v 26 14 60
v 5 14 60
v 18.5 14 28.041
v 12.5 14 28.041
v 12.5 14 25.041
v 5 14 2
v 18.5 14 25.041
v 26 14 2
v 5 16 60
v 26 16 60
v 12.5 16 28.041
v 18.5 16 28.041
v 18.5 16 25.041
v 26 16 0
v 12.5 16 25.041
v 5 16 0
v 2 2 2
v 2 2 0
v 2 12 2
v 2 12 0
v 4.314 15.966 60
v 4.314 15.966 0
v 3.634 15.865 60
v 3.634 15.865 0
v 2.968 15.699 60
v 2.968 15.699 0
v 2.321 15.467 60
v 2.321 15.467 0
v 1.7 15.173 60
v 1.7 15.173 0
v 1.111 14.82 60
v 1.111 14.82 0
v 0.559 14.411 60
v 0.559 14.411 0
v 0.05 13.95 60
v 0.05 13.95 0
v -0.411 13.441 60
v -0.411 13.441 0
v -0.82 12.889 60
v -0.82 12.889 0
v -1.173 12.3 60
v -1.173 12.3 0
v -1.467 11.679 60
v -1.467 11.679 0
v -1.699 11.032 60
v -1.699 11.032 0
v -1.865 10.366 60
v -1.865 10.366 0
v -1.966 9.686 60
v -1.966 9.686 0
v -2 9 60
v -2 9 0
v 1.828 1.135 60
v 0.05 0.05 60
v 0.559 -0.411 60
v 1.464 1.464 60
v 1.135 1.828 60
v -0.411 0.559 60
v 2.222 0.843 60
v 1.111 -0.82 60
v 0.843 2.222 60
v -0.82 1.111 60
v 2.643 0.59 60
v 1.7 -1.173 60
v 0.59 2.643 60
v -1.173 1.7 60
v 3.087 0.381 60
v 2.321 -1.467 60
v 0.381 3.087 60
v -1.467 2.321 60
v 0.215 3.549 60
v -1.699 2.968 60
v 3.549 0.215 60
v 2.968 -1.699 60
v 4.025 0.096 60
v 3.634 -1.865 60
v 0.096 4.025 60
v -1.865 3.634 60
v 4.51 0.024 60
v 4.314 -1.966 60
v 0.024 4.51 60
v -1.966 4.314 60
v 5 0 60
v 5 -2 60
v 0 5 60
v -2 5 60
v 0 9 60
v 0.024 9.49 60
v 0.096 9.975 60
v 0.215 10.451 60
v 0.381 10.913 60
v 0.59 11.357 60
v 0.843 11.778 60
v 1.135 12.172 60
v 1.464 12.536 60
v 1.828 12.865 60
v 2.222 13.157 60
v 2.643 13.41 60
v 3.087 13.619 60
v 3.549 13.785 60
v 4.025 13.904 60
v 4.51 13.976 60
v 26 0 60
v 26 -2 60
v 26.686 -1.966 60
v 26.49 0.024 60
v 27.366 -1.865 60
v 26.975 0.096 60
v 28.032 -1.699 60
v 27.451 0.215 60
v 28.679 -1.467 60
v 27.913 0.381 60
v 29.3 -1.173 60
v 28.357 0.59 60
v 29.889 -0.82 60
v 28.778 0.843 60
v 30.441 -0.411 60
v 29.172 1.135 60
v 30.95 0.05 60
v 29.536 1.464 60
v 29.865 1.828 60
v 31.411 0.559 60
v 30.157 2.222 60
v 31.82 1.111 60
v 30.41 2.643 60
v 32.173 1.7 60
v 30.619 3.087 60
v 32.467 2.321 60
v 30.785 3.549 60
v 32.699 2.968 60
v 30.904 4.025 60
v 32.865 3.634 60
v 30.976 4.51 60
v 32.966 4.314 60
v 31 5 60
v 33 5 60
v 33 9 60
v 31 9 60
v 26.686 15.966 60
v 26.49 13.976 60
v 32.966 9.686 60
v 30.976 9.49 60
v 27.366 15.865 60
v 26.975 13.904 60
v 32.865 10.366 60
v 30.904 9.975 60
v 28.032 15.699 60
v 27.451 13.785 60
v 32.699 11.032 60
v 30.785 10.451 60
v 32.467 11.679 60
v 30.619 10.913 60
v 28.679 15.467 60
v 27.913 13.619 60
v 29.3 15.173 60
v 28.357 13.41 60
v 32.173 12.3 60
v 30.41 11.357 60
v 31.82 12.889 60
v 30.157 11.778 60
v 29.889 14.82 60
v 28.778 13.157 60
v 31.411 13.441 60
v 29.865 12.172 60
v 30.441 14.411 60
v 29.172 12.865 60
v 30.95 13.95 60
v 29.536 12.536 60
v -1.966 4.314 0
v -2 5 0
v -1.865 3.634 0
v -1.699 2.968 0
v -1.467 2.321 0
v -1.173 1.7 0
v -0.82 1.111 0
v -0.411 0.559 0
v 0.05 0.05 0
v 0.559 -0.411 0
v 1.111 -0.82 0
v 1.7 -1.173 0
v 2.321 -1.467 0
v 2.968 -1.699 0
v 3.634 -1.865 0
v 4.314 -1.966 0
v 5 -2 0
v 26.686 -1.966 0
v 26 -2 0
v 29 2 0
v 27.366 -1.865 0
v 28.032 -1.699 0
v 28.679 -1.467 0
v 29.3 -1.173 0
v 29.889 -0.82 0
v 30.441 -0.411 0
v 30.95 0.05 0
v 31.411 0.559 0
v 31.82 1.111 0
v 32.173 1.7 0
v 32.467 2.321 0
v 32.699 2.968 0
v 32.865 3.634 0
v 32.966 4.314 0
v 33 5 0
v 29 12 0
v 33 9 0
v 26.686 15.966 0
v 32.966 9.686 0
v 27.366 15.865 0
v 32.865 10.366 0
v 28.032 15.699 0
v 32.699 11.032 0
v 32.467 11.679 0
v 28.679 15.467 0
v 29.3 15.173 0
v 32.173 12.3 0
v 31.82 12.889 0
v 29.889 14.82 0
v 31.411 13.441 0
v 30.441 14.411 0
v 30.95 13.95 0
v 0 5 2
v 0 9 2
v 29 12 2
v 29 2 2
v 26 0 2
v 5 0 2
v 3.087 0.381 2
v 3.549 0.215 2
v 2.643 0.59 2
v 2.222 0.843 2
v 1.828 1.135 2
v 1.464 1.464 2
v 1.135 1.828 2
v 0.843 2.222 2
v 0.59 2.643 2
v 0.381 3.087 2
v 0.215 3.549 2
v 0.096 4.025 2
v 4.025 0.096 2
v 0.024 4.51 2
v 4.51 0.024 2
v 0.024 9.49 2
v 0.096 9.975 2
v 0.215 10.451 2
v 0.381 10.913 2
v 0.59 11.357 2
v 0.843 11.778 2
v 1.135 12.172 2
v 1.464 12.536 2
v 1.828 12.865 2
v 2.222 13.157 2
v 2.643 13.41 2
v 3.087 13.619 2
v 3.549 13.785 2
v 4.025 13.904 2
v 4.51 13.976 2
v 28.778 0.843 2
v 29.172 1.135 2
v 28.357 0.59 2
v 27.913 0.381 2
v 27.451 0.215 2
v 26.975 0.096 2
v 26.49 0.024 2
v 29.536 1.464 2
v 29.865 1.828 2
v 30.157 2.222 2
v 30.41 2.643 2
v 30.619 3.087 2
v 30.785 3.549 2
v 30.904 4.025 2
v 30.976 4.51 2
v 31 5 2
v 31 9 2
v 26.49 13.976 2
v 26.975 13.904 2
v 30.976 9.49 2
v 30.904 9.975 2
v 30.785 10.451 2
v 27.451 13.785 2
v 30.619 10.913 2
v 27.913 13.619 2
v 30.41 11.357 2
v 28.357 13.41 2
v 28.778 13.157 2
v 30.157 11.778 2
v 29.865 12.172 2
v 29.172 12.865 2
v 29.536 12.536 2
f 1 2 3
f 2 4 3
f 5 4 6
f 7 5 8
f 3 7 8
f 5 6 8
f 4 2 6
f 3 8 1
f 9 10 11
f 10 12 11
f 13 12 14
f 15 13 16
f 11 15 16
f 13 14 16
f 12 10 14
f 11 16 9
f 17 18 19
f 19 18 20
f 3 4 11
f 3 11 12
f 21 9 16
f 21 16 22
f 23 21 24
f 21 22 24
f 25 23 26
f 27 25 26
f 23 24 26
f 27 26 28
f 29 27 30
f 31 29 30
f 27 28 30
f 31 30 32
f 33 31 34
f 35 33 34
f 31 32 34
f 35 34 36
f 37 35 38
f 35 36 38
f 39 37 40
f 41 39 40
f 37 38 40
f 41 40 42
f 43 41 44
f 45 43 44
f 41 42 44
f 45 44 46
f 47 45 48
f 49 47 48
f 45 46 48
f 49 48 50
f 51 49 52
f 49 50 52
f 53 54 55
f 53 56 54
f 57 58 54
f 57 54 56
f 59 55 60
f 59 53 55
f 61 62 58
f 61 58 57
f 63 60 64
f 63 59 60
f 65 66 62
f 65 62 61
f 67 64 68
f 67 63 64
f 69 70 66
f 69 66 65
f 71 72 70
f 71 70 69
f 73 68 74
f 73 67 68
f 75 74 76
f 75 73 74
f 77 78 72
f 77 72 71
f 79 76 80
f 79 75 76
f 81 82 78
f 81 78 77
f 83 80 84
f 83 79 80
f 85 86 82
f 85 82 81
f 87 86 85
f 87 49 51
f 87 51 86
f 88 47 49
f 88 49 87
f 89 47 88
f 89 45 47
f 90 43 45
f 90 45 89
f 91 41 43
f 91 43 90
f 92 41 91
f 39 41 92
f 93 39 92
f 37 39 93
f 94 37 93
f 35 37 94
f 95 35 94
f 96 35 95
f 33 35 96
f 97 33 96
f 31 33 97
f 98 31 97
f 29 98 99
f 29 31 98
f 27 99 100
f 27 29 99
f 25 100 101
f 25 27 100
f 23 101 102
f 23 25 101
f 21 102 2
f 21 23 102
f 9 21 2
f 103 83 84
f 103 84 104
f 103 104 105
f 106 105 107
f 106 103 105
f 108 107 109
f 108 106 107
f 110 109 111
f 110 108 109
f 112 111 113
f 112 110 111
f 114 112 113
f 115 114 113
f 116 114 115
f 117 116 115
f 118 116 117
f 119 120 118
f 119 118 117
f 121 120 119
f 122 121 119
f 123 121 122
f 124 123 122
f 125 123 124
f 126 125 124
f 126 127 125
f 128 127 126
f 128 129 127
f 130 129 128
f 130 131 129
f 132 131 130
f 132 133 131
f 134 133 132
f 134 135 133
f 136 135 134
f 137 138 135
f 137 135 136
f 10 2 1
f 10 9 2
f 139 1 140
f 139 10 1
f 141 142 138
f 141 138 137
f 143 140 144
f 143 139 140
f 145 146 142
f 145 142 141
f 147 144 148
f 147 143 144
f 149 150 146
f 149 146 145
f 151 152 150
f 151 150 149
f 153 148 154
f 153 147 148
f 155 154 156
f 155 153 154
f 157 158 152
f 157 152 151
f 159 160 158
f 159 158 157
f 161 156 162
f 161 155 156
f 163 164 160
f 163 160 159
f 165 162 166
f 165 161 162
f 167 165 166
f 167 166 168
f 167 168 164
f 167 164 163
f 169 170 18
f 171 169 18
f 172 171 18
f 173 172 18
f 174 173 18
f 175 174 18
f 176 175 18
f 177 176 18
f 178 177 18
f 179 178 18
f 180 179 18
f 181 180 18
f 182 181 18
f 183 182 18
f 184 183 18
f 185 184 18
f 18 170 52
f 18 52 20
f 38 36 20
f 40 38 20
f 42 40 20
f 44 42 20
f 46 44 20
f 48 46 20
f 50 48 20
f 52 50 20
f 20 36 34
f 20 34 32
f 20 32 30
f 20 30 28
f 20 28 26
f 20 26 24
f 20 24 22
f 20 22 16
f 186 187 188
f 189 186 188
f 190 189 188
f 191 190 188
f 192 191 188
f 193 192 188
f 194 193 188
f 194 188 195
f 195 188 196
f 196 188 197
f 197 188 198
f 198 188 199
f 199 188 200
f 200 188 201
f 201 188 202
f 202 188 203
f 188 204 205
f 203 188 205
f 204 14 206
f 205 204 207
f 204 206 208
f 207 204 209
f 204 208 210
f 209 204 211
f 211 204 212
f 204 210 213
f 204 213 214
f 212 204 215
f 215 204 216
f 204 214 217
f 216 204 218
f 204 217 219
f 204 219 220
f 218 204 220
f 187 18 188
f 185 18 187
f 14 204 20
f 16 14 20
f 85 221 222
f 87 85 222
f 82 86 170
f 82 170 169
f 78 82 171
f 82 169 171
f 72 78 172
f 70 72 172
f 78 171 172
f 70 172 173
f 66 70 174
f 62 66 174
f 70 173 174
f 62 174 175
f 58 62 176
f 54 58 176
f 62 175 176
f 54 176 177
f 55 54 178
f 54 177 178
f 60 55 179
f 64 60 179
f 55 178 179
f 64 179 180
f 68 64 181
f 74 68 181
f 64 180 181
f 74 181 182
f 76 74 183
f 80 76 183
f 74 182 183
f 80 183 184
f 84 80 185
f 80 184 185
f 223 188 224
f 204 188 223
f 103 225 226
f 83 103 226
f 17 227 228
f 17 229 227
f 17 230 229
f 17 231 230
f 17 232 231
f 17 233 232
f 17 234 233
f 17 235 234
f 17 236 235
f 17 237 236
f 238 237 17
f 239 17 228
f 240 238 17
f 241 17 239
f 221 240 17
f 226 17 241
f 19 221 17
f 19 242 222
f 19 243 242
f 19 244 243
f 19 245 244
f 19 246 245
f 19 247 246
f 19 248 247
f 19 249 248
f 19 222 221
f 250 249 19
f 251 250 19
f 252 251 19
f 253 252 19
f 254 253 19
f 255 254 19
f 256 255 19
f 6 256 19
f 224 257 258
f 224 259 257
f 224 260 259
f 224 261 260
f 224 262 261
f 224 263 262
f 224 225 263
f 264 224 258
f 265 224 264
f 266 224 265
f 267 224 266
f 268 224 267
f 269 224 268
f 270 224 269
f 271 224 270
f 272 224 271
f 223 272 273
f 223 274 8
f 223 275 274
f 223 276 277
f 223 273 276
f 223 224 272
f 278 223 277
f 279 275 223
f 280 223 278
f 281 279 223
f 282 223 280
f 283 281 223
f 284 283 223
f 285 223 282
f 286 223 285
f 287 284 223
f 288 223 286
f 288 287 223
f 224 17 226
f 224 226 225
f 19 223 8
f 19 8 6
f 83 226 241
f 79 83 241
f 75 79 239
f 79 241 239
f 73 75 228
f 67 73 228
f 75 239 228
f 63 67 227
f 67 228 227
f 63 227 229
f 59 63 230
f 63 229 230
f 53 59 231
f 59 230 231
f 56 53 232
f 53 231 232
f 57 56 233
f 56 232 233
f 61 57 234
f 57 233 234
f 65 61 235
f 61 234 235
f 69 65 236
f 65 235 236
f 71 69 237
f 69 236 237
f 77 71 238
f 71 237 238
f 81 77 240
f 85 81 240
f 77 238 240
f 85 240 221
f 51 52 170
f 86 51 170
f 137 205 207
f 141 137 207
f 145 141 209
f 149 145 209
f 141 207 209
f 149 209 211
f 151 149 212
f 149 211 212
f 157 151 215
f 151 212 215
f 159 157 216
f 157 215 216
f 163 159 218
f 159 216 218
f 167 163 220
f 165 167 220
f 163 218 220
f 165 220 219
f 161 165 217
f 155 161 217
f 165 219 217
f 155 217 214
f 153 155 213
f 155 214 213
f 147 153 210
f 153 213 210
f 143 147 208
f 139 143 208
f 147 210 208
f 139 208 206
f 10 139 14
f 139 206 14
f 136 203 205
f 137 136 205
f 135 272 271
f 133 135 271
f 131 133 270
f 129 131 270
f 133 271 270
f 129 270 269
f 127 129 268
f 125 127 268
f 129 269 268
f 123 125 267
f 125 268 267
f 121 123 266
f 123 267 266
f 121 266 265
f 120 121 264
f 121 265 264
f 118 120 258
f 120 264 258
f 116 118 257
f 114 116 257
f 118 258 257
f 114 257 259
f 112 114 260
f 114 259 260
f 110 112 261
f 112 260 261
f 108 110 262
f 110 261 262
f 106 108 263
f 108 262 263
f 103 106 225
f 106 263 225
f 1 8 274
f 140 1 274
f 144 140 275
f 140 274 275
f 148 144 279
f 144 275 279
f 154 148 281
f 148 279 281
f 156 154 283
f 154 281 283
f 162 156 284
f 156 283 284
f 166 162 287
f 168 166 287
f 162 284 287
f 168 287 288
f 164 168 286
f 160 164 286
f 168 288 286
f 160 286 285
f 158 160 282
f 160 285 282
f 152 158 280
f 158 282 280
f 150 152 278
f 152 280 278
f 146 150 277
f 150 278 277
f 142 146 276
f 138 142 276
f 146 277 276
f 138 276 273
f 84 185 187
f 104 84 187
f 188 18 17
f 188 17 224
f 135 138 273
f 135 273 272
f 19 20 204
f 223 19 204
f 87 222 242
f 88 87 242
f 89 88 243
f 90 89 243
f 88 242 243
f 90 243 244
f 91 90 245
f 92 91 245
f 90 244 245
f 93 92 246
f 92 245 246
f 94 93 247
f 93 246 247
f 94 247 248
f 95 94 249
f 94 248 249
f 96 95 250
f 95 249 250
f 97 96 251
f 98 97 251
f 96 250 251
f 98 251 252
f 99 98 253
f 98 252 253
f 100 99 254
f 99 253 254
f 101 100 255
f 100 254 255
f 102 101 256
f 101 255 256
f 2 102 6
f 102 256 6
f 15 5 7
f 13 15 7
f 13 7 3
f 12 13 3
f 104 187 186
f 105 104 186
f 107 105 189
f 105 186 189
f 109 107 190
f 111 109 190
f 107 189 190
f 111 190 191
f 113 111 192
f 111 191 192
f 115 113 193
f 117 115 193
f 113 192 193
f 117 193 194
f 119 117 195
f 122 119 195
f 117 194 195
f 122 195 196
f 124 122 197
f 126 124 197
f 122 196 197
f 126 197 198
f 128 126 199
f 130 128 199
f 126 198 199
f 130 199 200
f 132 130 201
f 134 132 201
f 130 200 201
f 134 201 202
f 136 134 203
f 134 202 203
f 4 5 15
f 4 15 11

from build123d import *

# Parameters (mm, degrees)
F0_W     = 27
F0_H     = 10
F1_DEPTH = 2
F2_DEPTH = 60
F3_W     = 6
F3_H     = 3
F4_DEPTH = 25


with BuildPart() as f1:
    # F0 (on Top) → F1 (new body)
    with BuildSketch(Plane.XY):
        with BuildLine():
            Line((26, 16), (5, 16))
            ThreePointArc((5, 16), (0.0502525317, 13.9497474683), (-2, 9))
            Line((-2, 9), (-2, 5))
            ThreePointArc((-2, 5), (0.0502525317, 0.0502525317), (5, -2))
            Line((5, -2), (26, -2))
            ThreePointArc((26, -2), (30.9497474683, 0.0502525317), (33, 5))
            Line((33, 5), (33, 9))
            ThreePointArc((33, 9), (30.9497474683, 13.9497474683), (26, 16))
        make_face()
        with BuildLine():
            Line((26, 0), (5, 0))
            ThreePointArc((5, 0), (1.4644660941, 1.4644660941), (0, 5))
            Line((0, 5), (0, 9))
            ThreePointArc((0, 9), (1.4644660941, 12.5355339059), (5, 14))
            Line((5, 14), (26, 14))
            ThreePointArc((26, 14), (29.5355339059, 12.5355339059), (31, 9))
            Line((31, 9), (31, 5))
            ThreePointArc((31, 5), (29.5355339059, 1.4644660941), (26, 0))
        make_face(mode=Mode.SUBTRACT)
        with BuildLine():
            ThreePointArc((0, 5), (1.4644660941, 1.4644660941), (5, 0))
            Line((5, 0), (26, 0))
            ThreePointArc((26, 0), (29.5355339059, 1.4644660941), (31, 5))
            Line((31, 5), (31, 9))
            ThreePointArc((31, 9), (29.5355339059, 12.5355339059), (26, 14))
            Line((26, 14), (5, 14))
            ThreePointArc((5, 14), (1.4644660941, 12.5355339059), (0, 9))
            Line((0, 9), (0, 5))
        make_face()
        with Locations((15.5, 7)):
            Rectangle(F0_W, F0_H, mode=Mode.SUBTRACT)
    extrude(amount=F1_DEPTH)

    # F0 (on Top) → F2 (join)
    with BuildSketch(Plane.XY):
        with BuildLine():
            Line((26, 16), (5, 16))
            ThreePointArc((5, 16), (0.0502525317, 13.9497474683), (-2, 9))
            Line((-2, 9), (-2, 5))
            ThreePointArc((-2, 5), (0.0502525317, 0.0502525317), (5, -2))
            Line((5, -2), (26, -2))
            ThreePointArc((26, -2), (30.9497474683, 0.0502525317), (33, 5))
            Line((33, 5), (33, 9))
            ThreePointArc((33, 9), (30.9497474683, 13.9497474683), (26, 16))
        make_face()
        with BuildLine():
            Line((26, 0), (5, 0))
            ThreePointArc((5, 0), (1.4644660941, 1.4644660941), (0, 5))
            Line((0, 5), (0, 9))
            ThreePointArc((0, 9), (1.4644660941, 12.5355339059), (5, 14))
            Line((5, 14), (26, 14))
            ThreePointArc((26, 14), (29.5355339059, 12.5355339059), (31, 9))
            Line((31, 9), (31, 5))
            ThreePointArc((31, 5), (29.5355339059, 1.4644660941), (26, 0))
        make_face(mode=Mode.SUBTRACT)
    extrude(amount=F2_DEPTH)

    # F3 (on Front) → F4 (cut)
    with BuildSketch(Plane.XZ):
        with Locations((15.5, 26.5405690297)):
            Rectangle(F3_W, F3_H)
    extrude(amount=-F4_DEPTH, mode=Mode.SUBTRACT)


solid = f1.part
